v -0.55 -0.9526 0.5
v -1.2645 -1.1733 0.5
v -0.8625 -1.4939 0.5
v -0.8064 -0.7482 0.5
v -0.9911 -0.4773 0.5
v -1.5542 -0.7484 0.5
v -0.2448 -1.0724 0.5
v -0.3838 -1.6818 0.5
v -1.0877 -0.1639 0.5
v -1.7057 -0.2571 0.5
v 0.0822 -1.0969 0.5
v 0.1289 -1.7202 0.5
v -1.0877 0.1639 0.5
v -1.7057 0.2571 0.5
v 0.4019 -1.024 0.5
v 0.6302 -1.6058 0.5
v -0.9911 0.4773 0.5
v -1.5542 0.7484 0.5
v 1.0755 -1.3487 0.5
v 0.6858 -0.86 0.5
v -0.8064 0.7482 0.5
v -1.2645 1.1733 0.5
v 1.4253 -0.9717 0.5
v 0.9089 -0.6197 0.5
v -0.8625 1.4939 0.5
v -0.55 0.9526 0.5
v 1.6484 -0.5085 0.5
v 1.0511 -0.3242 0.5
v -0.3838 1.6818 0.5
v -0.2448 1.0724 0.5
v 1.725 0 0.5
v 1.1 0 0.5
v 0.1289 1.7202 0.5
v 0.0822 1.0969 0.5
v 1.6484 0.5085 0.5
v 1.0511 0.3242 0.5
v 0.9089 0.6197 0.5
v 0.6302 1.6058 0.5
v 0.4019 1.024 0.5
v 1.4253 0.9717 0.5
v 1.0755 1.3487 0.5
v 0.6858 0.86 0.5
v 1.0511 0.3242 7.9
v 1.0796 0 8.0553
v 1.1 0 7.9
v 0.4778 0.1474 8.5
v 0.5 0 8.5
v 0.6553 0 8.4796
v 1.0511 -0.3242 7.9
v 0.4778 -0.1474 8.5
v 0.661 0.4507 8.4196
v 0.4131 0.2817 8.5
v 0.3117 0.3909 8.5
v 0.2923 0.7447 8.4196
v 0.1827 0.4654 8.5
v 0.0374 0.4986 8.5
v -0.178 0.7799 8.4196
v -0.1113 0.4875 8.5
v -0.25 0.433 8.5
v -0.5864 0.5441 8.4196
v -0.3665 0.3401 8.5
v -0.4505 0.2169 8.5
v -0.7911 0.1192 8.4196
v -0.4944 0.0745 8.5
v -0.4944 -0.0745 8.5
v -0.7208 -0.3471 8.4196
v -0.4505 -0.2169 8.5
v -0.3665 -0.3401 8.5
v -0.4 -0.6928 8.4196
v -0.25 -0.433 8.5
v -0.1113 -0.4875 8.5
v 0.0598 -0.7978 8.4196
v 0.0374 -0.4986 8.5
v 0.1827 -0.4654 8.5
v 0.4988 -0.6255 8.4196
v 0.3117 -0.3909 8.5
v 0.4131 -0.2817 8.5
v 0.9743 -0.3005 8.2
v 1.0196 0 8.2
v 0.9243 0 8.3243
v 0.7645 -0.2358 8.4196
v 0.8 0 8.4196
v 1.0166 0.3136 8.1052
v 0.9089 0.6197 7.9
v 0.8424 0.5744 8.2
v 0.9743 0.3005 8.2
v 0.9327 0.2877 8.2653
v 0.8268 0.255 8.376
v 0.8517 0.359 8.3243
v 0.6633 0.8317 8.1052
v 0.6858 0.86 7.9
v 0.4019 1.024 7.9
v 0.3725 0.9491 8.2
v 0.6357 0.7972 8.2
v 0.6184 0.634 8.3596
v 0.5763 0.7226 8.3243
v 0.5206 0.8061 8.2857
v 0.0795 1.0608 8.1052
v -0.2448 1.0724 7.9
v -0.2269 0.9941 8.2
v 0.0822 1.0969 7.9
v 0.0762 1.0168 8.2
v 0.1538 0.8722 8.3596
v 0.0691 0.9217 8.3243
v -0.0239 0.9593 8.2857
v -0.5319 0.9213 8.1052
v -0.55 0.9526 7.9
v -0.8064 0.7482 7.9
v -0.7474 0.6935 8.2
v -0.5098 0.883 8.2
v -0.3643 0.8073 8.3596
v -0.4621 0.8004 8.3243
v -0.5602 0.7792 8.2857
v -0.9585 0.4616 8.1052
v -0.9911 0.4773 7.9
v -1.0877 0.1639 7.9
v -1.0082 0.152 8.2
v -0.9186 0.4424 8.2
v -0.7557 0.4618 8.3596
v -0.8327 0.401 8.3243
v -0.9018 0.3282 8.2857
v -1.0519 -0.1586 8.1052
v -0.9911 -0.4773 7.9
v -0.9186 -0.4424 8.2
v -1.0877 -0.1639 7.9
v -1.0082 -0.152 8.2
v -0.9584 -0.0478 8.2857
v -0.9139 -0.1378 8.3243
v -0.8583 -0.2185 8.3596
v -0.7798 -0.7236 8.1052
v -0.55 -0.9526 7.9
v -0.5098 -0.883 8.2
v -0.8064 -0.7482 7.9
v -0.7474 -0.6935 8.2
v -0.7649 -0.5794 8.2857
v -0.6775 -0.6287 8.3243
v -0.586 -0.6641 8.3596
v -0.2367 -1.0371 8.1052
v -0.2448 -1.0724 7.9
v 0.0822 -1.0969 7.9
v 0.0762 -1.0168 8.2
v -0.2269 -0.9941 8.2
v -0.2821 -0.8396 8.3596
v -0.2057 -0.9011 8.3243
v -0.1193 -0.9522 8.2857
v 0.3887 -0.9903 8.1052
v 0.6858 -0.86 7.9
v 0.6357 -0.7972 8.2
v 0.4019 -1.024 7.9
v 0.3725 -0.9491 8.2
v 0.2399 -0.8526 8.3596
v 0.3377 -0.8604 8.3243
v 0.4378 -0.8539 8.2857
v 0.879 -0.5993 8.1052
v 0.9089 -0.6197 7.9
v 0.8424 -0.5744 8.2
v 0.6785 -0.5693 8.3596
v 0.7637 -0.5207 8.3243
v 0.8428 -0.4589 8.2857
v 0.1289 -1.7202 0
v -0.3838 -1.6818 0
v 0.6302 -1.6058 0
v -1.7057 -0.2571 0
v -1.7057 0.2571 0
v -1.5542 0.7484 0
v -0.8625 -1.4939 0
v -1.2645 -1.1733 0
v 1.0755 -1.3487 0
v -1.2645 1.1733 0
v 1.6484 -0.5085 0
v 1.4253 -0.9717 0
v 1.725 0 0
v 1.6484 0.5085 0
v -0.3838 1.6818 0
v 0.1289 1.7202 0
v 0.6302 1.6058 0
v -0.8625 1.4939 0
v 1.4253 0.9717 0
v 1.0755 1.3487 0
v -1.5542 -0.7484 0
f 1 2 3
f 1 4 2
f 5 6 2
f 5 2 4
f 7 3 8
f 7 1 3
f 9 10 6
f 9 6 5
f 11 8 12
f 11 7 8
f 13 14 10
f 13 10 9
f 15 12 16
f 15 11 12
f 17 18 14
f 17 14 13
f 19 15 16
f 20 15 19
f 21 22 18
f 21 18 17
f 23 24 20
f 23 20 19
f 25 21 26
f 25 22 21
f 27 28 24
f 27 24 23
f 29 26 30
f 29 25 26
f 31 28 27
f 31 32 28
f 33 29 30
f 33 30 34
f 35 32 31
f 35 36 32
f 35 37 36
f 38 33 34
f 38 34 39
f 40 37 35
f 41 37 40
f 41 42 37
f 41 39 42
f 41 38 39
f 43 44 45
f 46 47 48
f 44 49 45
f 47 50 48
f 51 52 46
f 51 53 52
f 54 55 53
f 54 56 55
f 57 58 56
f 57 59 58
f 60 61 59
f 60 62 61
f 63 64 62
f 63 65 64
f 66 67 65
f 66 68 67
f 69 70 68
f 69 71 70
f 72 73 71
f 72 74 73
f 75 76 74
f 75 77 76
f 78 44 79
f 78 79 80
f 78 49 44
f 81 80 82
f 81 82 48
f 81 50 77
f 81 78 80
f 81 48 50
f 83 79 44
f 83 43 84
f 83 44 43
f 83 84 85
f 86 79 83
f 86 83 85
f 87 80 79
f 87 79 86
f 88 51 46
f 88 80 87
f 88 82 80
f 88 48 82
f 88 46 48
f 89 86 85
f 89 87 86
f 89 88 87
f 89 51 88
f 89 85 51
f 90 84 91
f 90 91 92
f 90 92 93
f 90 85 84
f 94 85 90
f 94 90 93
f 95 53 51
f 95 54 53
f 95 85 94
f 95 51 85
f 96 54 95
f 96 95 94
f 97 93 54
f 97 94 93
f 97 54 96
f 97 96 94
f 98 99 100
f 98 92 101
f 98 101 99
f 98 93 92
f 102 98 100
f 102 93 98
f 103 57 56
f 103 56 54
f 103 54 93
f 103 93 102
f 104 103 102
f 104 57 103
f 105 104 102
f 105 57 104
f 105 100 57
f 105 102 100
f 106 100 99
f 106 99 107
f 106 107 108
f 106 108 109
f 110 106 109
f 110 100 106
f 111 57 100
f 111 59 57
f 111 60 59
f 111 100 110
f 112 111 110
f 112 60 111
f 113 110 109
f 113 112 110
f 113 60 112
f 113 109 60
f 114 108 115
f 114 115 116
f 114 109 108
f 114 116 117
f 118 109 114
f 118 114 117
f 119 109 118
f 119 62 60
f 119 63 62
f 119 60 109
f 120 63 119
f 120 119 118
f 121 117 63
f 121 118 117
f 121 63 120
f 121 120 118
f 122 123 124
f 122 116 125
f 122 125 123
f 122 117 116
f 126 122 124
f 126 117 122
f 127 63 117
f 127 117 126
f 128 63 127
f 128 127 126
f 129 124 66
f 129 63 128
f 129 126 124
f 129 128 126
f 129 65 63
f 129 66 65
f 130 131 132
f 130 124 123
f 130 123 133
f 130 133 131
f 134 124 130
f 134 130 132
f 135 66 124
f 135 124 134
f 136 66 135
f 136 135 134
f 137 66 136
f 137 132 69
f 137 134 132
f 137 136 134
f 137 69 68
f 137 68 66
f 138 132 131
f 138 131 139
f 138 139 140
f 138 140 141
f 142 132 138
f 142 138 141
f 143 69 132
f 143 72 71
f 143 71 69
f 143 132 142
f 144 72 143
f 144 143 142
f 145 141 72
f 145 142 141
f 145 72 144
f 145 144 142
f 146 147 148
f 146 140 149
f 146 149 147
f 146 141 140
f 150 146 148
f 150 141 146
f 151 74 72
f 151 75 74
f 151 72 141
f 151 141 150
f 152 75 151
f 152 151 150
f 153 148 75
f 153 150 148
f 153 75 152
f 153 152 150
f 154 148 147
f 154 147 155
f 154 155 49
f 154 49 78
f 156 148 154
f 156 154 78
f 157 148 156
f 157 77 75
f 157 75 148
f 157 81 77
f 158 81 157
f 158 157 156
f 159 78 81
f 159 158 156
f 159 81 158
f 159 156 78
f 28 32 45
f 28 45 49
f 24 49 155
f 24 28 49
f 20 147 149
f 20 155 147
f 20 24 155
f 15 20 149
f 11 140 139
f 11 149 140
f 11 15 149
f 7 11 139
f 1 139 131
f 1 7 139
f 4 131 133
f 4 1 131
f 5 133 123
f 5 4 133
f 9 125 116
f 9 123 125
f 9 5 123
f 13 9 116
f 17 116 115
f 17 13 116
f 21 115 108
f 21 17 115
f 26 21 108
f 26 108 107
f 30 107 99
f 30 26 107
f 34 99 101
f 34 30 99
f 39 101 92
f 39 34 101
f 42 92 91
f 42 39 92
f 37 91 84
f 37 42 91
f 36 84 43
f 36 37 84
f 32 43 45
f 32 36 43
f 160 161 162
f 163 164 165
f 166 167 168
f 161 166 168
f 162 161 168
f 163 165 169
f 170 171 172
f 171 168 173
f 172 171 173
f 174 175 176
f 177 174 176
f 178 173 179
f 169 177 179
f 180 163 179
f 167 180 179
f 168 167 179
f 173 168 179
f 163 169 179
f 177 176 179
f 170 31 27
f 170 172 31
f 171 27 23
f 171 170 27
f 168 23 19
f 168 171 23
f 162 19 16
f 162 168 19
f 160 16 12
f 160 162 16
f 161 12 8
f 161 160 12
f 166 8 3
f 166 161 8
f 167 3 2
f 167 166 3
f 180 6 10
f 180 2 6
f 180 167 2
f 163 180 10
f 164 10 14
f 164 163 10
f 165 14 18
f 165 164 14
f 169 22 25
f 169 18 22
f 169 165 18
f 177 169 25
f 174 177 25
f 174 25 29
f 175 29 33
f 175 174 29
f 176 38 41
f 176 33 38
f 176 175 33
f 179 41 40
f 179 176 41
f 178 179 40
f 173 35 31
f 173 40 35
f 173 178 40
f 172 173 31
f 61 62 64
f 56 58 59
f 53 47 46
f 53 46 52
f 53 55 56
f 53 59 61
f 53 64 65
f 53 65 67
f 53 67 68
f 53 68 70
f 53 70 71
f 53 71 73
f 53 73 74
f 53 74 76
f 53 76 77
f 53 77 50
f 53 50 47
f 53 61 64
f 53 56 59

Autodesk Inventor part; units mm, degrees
ref_plane "YZ Plane" through (0, 0, 0) normal (1, 0, 0) x (0, 1, 0)
ref_plane "XZ Plane" through (0, 0, 0) normal (0, 1, 0) x (-1, 0, 0)
ref_plane "XY Plane" through (0, 0, 0) normal (0, 0, 1) x (1, 0, 0)
sketch "Sketch1" plane through (0, 0, 0) normal (0, 0, 1) x (1, 0, 0)
  circle A0 centre (0, 0) radius 1.725
  dimension "d0" = 3.45
extrude "Extrusion1" add sketch "Sketch1" along normal blind 0.5
sketch "Sketch2" plane through (0, 0, 0.5) normal (0, 0, 1) x (1, 0, 0)
  circle A0 centre (0, 0) radius 1.725 projected
  circle A1 centre (0, 0) radius 1.1
  dimension "d3" = 2.2
extrude "Extrusion2" add sketch "Sketch2" along normal blind 8 contours A1
fillet "Fillet1" radius 0.6 1 edges at (-1.1, 0, 8.5)
properties material "Copper"
